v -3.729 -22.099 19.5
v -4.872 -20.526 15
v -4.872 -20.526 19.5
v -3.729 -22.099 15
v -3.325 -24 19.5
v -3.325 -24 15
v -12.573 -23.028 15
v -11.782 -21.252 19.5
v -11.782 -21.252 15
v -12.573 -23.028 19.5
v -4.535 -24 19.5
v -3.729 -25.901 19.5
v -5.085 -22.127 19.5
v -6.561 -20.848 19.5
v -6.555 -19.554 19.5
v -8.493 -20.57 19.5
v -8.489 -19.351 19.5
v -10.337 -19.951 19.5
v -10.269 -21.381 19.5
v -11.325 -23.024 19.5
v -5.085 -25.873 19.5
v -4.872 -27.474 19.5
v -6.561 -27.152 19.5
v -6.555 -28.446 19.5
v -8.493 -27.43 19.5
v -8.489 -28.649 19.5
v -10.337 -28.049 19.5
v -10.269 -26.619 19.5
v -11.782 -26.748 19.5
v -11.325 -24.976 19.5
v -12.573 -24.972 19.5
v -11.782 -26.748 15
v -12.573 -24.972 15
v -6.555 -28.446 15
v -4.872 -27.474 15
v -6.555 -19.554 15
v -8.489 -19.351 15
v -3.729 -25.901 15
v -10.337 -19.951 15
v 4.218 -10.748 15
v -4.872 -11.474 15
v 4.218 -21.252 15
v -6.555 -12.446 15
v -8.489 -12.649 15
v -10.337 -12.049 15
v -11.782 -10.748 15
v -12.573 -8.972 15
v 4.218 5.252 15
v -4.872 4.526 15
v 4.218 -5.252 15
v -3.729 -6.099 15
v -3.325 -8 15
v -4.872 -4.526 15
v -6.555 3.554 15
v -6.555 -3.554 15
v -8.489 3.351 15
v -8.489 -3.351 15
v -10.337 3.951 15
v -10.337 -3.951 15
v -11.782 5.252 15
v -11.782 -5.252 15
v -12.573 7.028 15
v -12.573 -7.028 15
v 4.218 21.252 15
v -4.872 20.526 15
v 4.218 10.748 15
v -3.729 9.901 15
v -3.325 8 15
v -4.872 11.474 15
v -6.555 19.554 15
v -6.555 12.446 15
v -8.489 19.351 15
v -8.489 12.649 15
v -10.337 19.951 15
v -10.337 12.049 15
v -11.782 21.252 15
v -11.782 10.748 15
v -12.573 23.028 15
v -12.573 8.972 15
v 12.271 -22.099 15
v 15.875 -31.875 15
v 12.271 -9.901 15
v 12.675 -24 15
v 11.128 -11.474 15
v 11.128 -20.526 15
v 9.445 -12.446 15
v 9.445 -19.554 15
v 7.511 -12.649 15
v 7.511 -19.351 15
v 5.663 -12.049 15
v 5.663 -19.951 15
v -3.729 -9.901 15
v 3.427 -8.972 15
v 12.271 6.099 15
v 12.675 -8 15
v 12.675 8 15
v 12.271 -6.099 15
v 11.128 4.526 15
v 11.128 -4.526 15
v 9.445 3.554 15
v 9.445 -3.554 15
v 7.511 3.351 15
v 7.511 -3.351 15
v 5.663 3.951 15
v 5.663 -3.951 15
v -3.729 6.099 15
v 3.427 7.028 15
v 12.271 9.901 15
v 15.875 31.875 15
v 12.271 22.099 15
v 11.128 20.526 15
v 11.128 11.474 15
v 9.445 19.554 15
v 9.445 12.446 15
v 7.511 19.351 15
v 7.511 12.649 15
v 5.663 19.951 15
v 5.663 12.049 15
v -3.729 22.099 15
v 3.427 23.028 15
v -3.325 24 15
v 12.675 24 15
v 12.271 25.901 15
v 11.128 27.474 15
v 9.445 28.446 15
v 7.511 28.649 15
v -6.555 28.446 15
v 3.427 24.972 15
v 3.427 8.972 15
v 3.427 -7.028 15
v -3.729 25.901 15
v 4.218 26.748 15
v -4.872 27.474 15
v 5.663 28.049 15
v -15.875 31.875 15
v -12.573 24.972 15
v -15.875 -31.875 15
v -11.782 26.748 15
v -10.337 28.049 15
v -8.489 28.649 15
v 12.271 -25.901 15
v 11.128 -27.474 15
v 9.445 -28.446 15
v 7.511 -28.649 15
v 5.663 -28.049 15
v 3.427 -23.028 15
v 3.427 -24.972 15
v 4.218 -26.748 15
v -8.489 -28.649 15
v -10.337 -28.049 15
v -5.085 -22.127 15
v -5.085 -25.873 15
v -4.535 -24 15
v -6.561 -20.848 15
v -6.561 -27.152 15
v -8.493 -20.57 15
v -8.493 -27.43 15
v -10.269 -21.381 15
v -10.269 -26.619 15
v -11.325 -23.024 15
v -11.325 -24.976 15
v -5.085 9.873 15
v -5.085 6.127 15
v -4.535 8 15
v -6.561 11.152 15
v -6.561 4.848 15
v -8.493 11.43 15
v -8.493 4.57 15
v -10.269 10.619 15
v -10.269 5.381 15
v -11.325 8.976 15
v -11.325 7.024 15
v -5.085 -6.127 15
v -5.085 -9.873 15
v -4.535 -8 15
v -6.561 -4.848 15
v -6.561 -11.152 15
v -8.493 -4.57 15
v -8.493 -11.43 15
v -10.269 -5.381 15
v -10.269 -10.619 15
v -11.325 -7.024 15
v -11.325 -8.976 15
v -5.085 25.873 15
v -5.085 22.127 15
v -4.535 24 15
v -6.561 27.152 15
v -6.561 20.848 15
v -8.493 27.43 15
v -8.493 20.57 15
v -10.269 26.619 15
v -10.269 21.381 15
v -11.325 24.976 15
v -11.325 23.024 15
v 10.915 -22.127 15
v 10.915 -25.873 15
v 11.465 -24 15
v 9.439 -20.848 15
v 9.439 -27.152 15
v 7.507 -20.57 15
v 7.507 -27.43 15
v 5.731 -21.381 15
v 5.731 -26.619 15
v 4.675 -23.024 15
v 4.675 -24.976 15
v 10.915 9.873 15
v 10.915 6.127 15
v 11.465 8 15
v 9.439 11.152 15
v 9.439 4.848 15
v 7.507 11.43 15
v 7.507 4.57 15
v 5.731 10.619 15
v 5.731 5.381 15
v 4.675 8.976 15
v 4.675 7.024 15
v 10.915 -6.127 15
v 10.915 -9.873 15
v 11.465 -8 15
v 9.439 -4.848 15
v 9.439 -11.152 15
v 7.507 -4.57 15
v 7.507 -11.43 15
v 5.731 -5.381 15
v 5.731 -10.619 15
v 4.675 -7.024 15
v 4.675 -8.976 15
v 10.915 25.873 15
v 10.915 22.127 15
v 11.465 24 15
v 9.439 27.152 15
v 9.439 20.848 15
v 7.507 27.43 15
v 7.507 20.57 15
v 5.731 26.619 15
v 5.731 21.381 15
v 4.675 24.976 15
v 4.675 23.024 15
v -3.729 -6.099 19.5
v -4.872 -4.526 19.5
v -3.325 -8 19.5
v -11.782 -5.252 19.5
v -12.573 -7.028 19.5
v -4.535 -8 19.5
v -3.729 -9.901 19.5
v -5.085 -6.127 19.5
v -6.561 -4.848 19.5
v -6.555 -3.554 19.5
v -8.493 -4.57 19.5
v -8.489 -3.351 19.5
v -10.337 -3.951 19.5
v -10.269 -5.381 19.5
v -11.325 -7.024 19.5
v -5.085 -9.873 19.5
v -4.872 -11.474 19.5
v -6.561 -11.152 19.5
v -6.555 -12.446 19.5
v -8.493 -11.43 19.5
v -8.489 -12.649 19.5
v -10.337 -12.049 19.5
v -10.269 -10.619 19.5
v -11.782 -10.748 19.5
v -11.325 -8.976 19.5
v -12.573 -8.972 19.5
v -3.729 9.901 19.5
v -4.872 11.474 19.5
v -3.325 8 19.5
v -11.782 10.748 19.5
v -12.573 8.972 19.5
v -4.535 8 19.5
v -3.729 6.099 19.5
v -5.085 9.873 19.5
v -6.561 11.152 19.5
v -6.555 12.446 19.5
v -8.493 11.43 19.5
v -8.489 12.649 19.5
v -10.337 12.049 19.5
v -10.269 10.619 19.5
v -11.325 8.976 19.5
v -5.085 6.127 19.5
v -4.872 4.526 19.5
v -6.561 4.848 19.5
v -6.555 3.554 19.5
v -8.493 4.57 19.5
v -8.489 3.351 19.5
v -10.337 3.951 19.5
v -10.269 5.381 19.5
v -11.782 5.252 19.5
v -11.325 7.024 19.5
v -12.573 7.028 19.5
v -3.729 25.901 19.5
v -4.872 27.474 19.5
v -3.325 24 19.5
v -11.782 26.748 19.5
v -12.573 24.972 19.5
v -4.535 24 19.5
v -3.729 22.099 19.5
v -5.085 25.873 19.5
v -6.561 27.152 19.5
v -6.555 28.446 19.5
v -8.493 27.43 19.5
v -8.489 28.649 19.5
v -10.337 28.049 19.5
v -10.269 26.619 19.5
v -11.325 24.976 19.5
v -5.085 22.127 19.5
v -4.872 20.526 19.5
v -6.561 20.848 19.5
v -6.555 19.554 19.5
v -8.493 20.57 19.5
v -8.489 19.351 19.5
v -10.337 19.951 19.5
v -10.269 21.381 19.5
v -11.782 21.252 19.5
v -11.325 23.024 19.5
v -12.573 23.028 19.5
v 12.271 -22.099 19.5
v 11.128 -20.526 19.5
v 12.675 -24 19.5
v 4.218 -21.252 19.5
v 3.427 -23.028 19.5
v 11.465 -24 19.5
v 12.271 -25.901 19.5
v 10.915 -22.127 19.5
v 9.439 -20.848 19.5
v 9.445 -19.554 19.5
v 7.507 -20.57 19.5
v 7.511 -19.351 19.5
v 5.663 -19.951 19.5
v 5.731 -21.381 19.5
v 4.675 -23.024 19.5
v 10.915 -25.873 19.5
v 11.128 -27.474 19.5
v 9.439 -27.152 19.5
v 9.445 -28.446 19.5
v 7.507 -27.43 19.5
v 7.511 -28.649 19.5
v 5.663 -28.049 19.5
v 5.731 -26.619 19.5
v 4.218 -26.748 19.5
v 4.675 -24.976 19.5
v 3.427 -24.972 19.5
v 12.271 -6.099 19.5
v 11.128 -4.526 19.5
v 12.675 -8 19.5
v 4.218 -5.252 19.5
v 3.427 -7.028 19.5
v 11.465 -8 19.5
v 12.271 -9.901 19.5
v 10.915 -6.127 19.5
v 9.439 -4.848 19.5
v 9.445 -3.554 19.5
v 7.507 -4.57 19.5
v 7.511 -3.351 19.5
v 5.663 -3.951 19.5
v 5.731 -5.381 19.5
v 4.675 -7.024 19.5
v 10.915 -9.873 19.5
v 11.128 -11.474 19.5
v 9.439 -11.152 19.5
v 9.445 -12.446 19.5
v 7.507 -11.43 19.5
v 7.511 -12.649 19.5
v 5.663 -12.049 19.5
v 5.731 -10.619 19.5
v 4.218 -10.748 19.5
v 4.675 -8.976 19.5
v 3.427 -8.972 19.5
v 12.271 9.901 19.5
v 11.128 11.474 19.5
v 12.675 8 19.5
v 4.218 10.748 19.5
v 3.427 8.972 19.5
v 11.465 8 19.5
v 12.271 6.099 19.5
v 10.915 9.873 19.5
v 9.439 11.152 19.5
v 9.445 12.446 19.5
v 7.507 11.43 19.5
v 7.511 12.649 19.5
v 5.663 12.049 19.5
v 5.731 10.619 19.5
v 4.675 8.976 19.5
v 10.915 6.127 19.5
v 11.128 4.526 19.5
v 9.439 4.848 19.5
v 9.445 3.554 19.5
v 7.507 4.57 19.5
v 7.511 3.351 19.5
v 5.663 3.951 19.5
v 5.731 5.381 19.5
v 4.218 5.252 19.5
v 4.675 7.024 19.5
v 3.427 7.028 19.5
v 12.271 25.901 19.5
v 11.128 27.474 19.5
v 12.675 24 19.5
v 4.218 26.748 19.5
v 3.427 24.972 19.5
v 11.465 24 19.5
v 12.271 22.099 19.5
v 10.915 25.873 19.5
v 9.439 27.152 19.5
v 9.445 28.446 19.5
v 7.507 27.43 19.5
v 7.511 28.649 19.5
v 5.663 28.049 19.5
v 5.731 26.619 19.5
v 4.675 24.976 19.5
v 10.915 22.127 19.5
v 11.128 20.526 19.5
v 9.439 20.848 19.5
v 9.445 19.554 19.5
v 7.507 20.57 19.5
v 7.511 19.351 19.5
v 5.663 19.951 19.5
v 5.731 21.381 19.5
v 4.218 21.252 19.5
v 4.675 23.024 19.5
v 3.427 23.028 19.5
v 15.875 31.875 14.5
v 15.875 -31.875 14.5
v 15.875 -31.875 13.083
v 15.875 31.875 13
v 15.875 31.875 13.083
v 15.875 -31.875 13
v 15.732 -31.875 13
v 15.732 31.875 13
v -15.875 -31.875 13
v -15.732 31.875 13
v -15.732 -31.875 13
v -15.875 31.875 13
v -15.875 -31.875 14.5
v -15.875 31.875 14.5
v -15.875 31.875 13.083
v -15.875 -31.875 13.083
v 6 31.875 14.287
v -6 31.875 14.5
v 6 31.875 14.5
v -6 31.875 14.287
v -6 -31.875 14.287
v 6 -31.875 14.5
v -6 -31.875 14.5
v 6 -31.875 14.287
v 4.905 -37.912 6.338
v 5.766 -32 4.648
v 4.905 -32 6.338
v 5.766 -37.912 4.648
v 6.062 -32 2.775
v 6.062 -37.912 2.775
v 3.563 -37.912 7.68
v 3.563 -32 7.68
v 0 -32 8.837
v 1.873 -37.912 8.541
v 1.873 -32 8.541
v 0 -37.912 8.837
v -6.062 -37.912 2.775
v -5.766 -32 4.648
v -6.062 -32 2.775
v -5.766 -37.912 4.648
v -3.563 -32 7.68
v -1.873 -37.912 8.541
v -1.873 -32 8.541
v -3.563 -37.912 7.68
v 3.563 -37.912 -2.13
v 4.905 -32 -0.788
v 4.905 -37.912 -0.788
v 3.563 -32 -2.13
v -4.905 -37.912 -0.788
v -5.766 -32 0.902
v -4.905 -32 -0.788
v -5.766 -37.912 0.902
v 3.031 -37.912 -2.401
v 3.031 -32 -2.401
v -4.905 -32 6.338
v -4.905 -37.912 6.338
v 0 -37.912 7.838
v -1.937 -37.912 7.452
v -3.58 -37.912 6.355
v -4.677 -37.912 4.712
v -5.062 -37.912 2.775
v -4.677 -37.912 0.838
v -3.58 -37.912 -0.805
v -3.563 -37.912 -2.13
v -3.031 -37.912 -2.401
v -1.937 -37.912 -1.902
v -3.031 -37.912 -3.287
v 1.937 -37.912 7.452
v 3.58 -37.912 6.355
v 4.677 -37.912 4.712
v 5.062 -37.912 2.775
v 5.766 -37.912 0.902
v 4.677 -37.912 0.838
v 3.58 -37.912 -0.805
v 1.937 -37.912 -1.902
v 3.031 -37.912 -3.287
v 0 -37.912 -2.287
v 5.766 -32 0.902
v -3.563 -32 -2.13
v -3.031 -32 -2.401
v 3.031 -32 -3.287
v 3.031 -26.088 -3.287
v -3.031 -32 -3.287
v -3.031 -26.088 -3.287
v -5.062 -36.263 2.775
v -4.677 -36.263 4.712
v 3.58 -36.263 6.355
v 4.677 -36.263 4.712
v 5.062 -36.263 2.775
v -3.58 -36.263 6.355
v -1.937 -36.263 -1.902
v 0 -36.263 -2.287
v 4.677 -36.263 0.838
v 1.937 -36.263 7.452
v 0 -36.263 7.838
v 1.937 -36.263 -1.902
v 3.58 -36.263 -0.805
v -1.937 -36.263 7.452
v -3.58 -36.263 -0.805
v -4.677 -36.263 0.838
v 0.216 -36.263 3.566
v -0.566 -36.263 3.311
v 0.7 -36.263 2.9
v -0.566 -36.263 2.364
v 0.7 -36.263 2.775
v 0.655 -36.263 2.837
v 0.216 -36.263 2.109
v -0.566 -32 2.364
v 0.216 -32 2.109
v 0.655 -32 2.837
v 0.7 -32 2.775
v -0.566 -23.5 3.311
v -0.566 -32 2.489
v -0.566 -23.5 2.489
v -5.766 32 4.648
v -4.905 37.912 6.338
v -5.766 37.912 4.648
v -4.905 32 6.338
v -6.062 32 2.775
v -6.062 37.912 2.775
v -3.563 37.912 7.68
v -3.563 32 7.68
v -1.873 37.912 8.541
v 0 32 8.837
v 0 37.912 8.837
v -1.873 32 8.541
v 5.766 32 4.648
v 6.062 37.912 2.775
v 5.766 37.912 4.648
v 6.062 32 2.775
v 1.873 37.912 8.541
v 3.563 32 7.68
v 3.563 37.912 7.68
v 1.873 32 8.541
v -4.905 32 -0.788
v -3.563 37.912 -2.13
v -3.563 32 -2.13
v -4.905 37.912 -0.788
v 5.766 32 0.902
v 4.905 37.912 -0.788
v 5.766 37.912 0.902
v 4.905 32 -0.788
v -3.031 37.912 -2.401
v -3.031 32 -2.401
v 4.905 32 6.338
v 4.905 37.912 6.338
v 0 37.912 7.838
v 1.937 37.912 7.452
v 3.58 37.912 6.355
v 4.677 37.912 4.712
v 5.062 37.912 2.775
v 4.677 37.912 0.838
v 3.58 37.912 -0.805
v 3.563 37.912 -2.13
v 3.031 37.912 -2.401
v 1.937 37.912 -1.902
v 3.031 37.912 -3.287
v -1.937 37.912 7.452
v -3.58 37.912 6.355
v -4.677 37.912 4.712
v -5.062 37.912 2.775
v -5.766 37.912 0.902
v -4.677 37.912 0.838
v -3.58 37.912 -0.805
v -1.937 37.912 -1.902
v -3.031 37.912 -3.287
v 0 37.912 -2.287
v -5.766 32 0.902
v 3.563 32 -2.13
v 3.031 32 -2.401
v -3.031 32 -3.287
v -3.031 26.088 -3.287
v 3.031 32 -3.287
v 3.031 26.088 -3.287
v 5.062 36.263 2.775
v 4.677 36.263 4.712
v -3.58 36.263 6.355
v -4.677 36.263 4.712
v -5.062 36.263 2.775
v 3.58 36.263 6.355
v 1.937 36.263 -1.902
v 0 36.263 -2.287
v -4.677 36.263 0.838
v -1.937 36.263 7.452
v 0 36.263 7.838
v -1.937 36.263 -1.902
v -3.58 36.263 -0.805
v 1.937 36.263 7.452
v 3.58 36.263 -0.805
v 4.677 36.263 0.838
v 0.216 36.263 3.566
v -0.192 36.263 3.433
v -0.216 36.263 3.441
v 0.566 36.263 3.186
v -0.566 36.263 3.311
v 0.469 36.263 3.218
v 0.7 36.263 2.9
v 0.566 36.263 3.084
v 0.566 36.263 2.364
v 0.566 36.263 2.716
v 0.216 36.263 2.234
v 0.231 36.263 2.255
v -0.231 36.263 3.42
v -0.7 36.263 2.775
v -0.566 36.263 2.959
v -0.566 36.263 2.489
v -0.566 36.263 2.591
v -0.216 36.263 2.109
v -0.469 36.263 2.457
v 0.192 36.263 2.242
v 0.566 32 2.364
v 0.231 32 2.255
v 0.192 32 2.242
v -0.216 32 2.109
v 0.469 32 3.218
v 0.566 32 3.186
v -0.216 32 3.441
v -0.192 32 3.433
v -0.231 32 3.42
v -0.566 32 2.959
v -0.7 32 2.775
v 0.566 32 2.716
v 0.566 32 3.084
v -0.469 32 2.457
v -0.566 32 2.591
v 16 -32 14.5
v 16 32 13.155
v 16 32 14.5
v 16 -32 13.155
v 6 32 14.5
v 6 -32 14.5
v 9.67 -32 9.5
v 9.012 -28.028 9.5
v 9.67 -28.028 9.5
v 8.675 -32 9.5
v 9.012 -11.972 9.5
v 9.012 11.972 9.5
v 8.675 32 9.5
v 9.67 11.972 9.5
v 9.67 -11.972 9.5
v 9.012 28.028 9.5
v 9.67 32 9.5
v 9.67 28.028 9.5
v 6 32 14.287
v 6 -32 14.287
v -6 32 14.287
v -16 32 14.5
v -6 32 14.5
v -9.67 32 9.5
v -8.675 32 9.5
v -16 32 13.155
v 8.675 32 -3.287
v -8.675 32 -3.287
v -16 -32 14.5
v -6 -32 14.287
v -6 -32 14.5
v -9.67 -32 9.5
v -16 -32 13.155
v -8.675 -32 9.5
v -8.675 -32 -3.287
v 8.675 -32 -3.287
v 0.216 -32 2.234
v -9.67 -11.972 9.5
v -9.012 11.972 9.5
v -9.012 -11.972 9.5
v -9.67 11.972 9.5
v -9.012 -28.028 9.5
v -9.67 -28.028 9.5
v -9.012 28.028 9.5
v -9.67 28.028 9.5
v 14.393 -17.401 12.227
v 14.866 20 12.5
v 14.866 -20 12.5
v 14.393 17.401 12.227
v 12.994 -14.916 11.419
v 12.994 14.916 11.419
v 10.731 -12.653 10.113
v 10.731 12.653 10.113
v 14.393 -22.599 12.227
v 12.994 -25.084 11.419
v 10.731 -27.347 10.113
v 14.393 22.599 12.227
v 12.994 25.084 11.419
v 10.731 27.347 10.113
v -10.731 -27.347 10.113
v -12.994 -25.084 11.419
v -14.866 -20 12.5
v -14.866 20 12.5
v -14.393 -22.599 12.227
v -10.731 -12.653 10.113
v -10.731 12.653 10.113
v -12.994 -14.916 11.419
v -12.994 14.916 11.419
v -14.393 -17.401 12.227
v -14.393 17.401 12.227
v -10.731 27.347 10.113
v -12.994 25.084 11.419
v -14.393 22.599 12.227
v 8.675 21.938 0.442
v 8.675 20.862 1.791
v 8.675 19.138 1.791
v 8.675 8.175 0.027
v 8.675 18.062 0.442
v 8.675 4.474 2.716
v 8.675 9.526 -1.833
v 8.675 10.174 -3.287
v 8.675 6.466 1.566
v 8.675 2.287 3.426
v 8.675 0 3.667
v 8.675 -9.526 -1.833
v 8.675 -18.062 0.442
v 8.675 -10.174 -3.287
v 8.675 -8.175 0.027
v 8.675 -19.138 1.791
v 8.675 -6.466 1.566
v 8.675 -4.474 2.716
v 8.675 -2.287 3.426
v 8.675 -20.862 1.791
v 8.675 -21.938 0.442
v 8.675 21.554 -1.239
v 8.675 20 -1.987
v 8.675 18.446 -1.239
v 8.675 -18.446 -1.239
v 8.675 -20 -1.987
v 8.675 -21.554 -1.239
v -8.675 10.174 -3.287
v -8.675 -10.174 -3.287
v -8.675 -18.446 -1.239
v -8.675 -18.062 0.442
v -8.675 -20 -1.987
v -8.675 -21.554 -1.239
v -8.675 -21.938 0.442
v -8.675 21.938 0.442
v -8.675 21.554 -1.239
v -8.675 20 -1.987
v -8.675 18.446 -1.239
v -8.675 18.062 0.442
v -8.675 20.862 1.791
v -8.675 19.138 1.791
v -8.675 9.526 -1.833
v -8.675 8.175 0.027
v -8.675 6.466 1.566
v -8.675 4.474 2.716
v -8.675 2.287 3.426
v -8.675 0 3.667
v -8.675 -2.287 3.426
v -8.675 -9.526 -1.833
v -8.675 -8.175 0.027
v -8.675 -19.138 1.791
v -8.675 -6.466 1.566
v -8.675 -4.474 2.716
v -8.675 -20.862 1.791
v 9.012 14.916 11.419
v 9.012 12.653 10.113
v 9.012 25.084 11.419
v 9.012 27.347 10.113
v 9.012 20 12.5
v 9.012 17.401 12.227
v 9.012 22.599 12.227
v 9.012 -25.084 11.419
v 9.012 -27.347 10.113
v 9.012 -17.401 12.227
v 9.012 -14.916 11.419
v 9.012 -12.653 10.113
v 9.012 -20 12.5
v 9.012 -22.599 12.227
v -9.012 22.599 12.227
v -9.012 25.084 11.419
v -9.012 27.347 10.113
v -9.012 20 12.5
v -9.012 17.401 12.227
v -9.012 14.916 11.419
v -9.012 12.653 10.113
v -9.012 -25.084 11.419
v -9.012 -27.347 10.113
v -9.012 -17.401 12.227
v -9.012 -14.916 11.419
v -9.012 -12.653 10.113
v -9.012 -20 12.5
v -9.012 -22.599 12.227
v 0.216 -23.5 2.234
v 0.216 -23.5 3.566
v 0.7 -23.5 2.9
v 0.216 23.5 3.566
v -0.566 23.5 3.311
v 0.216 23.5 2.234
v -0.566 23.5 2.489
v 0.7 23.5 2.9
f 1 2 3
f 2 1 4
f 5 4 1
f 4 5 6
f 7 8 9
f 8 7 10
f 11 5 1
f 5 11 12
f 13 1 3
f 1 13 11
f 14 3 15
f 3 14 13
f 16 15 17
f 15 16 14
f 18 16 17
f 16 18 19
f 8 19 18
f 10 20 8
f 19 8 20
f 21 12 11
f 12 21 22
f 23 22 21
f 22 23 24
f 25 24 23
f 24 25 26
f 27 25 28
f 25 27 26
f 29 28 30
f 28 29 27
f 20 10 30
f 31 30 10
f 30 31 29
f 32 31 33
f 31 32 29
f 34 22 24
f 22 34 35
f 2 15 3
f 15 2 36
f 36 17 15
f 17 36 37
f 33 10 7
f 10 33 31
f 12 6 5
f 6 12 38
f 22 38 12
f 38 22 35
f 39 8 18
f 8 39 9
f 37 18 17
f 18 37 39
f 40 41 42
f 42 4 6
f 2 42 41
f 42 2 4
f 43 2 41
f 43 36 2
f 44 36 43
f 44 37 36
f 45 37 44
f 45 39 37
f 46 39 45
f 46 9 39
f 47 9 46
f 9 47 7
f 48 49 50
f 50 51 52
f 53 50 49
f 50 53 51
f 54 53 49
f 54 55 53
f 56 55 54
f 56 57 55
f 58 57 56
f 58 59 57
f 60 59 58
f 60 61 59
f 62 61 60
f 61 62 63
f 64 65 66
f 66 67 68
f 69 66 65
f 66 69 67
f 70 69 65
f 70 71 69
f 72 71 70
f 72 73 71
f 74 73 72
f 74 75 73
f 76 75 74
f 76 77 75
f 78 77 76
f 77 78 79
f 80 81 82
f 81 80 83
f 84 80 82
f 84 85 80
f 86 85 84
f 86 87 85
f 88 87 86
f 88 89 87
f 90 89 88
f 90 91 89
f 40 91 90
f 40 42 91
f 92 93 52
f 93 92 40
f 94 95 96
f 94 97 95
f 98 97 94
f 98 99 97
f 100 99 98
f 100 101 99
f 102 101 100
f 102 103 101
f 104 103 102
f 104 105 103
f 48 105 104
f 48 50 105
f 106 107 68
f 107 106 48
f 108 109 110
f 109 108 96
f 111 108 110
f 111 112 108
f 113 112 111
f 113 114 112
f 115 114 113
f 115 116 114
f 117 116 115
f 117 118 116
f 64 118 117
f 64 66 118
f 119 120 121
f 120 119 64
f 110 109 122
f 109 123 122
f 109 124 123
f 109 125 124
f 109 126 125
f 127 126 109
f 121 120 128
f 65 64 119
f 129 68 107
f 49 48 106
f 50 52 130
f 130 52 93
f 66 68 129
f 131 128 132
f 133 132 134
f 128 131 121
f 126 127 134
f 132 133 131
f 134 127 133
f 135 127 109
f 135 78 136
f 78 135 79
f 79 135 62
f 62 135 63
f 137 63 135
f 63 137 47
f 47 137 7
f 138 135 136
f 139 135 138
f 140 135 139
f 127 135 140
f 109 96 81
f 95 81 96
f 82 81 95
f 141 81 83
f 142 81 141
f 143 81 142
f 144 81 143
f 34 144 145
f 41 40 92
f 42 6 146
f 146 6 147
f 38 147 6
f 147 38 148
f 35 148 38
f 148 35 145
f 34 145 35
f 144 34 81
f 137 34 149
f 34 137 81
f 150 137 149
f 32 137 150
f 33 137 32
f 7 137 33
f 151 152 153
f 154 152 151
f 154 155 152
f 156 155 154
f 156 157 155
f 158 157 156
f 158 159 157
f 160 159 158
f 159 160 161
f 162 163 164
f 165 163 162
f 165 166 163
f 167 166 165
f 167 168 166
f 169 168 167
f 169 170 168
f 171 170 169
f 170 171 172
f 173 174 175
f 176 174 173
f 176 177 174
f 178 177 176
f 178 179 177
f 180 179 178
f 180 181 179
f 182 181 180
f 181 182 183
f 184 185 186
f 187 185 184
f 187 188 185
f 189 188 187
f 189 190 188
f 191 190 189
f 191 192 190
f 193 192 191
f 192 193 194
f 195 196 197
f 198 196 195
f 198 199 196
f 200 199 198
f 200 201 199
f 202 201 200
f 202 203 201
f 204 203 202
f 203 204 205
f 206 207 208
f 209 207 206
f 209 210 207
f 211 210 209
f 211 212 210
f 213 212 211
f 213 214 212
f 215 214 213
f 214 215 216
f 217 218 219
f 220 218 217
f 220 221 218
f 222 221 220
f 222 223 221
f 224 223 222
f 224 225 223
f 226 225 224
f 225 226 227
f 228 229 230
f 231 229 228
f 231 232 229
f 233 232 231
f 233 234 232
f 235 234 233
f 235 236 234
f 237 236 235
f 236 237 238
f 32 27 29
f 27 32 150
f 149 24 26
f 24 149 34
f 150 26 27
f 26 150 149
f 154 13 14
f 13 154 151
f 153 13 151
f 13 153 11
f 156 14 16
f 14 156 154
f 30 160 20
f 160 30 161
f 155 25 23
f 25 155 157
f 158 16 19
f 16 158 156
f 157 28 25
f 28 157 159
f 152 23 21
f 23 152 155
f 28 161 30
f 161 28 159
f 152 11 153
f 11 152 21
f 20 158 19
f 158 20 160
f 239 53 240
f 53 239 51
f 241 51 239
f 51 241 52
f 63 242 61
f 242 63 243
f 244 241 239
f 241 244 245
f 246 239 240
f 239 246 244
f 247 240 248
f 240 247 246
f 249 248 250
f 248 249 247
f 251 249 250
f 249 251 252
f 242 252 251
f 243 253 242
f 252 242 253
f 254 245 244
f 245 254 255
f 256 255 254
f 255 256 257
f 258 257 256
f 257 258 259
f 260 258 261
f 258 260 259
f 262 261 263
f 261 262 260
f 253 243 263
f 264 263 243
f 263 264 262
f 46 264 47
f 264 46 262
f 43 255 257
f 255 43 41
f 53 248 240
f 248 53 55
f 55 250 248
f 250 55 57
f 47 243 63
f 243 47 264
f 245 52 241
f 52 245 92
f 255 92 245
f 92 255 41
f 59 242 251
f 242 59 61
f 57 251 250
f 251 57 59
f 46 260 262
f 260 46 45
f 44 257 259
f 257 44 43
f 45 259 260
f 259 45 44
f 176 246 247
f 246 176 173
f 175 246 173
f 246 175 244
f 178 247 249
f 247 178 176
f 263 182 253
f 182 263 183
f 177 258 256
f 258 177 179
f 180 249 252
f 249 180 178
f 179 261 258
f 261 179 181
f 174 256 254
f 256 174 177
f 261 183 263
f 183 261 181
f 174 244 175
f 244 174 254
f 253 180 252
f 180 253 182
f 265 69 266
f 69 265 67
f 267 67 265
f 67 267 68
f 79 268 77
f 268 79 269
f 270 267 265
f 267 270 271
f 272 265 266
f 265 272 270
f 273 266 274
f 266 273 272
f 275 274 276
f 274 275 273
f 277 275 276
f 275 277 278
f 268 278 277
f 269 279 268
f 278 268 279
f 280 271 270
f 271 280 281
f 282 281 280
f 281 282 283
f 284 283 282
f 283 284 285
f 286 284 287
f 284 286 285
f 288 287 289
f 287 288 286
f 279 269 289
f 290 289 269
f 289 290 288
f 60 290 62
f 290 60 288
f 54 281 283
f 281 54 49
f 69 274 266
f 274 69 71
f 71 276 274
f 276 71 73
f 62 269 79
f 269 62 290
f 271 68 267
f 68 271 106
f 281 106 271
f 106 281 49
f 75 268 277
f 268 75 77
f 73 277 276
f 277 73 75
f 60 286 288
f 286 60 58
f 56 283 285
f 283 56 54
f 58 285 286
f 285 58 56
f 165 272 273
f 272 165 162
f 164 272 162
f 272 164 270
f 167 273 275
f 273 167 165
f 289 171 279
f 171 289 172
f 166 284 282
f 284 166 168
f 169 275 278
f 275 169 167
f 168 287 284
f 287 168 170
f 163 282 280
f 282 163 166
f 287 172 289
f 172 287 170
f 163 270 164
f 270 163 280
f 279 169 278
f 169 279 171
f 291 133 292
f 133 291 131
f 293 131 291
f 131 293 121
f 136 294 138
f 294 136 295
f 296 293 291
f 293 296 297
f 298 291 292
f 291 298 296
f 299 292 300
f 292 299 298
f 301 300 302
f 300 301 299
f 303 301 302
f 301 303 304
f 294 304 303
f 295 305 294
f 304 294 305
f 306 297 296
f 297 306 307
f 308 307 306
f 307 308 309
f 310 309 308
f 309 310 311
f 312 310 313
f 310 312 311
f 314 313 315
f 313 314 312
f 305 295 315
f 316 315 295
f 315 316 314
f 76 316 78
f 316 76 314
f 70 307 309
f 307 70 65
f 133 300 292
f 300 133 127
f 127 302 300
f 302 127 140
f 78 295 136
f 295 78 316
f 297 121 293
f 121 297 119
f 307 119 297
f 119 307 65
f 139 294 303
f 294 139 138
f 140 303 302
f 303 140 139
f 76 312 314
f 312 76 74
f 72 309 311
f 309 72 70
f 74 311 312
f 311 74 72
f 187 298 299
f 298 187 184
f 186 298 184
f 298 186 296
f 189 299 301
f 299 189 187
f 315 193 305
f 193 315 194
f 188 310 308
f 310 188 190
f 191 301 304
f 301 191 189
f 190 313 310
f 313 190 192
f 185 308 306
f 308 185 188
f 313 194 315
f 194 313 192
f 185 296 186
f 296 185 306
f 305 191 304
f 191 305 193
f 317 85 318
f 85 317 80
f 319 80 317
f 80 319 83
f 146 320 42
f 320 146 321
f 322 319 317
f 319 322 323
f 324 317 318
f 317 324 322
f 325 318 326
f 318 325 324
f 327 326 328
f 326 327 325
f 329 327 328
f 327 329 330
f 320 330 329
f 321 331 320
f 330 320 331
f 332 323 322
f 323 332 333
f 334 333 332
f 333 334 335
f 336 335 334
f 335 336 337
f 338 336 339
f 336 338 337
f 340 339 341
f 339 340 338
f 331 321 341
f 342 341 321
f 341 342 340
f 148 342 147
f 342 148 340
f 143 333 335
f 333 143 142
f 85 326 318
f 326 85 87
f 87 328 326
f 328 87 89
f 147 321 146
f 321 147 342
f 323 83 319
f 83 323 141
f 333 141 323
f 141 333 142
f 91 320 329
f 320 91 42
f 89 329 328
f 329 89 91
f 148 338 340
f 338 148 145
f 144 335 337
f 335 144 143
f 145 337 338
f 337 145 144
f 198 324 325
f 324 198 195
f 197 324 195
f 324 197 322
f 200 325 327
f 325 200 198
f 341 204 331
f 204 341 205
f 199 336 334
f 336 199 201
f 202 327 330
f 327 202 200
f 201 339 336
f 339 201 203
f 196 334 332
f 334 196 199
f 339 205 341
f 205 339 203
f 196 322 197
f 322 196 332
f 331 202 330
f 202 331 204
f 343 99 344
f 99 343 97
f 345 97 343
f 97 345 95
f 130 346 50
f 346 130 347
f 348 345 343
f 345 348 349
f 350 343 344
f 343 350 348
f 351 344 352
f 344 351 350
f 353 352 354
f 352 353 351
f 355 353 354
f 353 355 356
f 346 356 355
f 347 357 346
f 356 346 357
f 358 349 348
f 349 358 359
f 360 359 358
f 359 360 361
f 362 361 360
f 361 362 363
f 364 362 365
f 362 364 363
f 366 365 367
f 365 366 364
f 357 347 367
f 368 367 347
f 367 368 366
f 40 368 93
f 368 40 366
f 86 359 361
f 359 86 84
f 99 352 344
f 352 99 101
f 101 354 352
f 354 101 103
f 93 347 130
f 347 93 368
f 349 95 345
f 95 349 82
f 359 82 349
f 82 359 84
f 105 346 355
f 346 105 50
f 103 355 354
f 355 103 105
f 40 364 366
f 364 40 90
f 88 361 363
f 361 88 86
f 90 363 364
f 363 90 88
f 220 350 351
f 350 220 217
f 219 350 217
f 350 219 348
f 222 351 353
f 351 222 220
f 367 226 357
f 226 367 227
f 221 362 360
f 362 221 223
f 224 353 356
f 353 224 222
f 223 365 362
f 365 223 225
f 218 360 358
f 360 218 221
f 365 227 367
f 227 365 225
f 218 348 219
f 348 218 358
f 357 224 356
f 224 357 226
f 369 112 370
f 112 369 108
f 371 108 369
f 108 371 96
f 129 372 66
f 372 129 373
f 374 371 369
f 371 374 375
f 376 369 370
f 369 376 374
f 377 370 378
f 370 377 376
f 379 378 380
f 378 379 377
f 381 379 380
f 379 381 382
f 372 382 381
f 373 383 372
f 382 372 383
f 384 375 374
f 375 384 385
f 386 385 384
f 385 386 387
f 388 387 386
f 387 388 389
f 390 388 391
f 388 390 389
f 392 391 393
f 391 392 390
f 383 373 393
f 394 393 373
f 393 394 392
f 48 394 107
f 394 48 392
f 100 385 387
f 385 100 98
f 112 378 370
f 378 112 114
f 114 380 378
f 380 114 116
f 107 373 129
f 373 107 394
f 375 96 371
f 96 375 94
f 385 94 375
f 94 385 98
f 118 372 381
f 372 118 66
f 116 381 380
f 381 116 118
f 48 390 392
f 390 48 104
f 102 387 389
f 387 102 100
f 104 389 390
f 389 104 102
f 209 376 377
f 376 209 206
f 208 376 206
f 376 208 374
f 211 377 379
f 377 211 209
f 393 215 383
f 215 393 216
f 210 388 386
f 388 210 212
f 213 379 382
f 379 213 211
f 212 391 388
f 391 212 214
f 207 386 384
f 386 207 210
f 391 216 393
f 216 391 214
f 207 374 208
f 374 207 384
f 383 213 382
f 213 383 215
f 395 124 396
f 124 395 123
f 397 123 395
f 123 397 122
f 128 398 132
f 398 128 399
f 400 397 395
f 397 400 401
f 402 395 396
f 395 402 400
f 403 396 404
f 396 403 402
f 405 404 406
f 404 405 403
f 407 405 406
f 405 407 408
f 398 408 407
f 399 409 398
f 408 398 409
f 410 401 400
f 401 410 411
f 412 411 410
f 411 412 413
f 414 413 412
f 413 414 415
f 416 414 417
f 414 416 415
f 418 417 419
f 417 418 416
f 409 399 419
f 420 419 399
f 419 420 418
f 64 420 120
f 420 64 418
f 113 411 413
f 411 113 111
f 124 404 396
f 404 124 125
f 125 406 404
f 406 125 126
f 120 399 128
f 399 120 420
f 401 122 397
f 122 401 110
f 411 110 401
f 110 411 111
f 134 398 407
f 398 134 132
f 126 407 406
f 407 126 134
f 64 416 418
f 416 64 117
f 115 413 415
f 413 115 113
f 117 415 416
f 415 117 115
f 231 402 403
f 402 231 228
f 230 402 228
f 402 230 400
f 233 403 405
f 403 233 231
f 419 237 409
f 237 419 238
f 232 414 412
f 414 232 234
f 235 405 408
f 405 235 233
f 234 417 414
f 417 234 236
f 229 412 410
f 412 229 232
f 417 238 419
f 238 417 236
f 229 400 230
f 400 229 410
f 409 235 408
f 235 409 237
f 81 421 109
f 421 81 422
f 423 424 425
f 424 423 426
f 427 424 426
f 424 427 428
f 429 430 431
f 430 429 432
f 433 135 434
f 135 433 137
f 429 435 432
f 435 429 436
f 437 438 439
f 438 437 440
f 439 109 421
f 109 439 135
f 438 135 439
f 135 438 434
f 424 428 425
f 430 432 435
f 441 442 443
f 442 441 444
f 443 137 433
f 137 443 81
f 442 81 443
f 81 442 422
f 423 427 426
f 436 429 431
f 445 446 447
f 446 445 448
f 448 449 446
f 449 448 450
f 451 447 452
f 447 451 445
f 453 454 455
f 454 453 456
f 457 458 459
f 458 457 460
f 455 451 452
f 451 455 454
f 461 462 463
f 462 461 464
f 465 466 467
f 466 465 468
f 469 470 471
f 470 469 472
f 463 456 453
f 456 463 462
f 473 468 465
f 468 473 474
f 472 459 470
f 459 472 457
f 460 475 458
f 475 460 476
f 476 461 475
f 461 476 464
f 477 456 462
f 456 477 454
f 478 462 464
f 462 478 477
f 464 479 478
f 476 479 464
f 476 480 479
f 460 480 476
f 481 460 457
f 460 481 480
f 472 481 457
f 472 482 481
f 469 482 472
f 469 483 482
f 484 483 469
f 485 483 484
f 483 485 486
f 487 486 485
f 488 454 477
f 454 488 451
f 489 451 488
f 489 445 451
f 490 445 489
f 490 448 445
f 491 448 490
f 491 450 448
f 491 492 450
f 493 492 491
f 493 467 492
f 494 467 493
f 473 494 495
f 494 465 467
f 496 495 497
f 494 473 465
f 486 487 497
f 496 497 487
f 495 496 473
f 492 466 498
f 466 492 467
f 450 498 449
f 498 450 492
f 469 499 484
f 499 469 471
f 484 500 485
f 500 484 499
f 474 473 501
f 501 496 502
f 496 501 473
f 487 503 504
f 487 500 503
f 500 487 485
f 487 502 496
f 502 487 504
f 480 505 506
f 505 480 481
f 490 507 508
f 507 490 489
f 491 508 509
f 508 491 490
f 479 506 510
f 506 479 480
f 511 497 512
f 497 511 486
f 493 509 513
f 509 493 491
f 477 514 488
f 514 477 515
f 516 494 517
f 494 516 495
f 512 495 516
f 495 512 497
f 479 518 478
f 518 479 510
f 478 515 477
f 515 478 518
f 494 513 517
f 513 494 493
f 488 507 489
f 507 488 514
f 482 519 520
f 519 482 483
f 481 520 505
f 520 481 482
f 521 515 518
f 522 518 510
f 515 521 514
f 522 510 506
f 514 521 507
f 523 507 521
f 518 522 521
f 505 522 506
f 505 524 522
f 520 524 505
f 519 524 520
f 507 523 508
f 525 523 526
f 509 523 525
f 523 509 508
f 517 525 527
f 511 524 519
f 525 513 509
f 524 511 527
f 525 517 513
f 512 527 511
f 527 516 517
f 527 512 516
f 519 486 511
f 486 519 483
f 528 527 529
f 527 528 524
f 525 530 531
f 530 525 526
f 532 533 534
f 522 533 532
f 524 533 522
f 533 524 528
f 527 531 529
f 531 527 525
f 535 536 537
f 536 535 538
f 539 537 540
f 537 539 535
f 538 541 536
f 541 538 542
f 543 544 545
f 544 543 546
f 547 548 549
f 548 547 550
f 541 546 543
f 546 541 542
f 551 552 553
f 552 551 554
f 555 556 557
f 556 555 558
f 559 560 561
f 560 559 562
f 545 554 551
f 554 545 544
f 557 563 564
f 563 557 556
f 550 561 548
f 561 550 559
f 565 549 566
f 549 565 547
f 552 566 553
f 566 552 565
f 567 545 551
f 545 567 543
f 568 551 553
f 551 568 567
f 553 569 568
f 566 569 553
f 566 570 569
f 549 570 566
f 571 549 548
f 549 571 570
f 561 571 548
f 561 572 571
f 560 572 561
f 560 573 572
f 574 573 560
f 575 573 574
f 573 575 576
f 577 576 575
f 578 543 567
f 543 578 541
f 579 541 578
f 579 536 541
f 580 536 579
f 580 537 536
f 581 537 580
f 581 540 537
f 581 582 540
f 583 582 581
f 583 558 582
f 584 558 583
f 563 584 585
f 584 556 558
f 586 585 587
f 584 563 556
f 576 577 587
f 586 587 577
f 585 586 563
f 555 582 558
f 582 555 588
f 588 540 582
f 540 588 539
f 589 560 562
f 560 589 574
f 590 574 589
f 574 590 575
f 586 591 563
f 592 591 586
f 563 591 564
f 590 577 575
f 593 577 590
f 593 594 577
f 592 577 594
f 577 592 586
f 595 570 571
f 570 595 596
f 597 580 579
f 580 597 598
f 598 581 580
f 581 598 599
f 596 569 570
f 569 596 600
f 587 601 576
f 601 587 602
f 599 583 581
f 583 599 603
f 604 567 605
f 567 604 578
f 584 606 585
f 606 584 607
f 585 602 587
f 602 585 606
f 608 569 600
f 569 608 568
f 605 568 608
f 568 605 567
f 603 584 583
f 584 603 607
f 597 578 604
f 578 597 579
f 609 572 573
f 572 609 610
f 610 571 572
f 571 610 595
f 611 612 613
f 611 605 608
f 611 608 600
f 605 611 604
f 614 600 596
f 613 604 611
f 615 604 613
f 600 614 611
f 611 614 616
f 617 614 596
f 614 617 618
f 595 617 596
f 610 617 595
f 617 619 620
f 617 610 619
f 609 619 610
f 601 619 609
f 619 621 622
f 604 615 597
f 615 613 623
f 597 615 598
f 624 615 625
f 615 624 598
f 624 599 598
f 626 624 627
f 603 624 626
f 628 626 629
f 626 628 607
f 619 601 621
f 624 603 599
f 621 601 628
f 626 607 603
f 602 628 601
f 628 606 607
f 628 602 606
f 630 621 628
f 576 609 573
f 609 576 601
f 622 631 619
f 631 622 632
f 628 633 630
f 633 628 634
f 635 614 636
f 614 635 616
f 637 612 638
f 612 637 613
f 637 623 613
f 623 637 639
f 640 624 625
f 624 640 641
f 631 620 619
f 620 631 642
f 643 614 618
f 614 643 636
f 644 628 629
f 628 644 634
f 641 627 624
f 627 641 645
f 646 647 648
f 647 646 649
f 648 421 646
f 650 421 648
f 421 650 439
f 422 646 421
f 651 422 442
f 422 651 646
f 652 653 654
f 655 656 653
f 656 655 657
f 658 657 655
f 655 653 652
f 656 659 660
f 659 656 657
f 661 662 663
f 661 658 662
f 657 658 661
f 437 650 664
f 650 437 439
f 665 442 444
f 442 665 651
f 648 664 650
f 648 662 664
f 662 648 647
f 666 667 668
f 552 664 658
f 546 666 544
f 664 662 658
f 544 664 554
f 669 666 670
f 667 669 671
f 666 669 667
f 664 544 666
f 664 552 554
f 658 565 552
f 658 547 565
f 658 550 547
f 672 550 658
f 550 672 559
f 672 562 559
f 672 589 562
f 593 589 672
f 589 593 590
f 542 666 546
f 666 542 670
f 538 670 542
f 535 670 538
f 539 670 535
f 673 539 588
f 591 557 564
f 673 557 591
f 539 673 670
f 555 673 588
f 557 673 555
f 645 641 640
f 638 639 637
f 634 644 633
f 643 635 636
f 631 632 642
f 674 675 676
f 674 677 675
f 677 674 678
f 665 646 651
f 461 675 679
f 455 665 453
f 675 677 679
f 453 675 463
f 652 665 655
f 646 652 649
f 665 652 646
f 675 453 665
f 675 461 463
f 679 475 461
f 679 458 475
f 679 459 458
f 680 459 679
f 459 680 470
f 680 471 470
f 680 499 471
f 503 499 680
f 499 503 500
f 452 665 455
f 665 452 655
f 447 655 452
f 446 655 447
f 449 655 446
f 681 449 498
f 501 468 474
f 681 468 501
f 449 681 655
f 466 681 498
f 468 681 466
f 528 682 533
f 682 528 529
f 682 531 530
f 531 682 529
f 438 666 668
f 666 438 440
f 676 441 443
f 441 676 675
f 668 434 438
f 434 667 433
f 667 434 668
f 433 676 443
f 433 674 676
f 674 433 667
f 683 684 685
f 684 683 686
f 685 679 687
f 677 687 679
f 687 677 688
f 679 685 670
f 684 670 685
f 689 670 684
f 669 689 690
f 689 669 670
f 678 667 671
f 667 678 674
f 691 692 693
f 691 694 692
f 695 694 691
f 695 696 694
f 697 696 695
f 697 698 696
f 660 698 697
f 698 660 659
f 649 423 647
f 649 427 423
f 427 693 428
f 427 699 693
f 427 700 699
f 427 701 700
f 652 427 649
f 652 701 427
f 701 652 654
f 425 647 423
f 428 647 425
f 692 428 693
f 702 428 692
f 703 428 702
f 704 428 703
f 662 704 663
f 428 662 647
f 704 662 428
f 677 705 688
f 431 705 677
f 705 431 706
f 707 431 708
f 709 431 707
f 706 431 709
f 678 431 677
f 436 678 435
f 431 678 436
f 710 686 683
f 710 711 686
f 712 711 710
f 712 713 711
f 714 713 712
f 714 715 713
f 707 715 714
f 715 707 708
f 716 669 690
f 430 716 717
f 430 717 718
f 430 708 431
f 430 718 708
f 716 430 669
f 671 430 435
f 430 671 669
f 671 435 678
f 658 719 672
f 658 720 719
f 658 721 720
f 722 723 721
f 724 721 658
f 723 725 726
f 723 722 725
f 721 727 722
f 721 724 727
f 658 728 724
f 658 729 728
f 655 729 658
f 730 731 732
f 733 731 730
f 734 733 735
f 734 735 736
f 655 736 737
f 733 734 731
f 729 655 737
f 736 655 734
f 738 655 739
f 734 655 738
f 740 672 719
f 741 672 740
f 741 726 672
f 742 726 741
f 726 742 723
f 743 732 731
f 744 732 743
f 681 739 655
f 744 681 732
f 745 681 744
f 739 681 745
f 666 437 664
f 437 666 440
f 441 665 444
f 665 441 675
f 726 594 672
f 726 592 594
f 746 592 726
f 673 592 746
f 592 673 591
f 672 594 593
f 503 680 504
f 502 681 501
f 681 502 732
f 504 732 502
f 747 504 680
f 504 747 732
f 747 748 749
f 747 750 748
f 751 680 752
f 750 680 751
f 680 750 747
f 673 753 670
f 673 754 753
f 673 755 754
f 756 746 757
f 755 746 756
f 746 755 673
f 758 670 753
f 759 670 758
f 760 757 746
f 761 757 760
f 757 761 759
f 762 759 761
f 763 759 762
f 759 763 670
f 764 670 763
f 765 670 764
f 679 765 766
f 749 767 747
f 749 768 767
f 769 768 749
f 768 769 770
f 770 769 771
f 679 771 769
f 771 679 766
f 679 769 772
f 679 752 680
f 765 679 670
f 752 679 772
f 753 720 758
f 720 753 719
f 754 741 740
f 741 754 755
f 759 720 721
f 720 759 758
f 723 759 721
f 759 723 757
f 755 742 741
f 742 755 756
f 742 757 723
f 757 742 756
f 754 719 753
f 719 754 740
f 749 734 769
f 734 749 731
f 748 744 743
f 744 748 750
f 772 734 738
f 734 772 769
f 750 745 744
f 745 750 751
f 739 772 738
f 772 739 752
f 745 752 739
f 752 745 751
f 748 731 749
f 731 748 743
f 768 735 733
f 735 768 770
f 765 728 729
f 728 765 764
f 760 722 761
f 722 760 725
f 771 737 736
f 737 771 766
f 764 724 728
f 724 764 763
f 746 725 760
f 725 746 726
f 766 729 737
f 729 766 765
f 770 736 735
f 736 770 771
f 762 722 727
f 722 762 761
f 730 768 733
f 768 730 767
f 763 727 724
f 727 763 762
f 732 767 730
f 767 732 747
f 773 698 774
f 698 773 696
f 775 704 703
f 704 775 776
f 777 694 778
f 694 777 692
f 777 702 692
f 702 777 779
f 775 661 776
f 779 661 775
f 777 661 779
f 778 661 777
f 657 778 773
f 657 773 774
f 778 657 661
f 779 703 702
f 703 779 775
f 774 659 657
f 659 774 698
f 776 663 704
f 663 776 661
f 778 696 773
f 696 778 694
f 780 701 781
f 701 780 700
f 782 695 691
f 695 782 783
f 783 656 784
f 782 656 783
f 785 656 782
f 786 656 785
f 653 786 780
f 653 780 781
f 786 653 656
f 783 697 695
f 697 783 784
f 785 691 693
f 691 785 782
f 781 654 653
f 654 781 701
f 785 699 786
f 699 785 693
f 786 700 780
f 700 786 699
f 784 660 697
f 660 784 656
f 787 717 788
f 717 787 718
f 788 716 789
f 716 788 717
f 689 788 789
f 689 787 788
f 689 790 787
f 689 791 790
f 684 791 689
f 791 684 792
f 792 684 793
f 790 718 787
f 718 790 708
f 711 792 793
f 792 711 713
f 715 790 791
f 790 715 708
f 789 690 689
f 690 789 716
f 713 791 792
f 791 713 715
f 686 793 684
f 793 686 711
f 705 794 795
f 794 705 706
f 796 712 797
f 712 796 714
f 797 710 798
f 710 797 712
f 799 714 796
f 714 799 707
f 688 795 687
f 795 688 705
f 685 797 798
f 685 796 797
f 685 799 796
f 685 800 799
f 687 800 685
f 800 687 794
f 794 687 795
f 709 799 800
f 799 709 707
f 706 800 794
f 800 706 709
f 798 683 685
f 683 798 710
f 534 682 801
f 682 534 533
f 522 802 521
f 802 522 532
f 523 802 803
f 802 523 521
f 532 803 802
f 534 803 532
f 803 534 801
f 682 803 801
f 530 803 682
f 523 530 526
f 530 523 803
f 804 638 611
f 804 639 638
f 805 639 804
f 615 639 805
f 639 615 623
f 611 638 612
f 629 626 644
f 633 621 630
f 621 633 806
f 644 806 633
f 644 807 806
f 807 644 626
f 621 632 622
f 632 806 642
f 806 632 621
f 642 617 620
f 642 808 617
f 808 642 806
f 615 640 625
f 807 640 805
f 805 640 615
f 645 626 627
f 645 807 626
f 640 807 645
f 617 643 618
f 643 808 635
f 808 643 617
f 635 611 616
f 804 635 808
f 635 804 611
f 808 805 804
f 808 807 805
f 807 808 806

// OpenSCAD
module duplo_nipple(outer = 9.35, inner = 6.93, height = 4.5)
{
  difference()
  {
    cylinder(height,outer/2,outer/2,center=true);
    cylinder(height+1,inner/2,inner/2,center=true);
  }
}

module duplo_top(x = 2, y = 4, spacing = 16.0, parimeter = 3.2+9.35/2, height = 4.5, thickness = 2)
{
  union()
  {
    for (i = [0:x-1]) 
    {
      for (j = [0:y-1])
      {
        translate([((i-(x-1)/2)*spacing),((j-(y-1)/2)*spacing),(height+thickness)/2]) duplo_nipple();
      }
    }
    cube([(x-1)*spacing+2*parimeter,(y-1)*spacing+2*parimeter,thickness],center=true);
  }
}


module duplo_support(width, height, y = 4, spacing = 16.0, parimeter = 3.2+9.35/2, height = 4.5, thickness = 2)
{
  cube([width,(y-1)*spacing+2*parimeter,height],center=true);
}


module wheel2(wheel_thinkness = 4.0, 
wheel_diameter = 22.0,
axel_diameter = 5.0,
axel_mount_depth = 6.0)
{
  axel_support_thinkness = 1;
  center_slant = wheel_diameter;
  center_diameter = axel_mount_depth + axel_support_thinkness;
  difference()
  {
    union()
    {
      difference()
      {
        cylinder(wheel_thinkness,wheel_diameter/2,wheel_diameter/2,center=true);
        cylinder(wheel_thinkness+0.1,(wheel_diameter-3)/2,0,center=true);
      }
      translate([0,0,-(axel_mount_depth-wheel_thinkness)/2]) cylinder(axel_mount_depth,center_diameter/2,center_slant/2,center=true);
    }
    translate([0,0,-(axel_mount_depth-wheel_thinkness)/2]) cylinder(axel_mount_depth+1,axel_diameter/2,axel_diameter/2,center=true);
  }
}

module simple_axel(length, thickness)
{
  cylinder(length,thickness/2,thickness/2,center=true);
}

module wheel_assembly(wheel_base = 25.35,
wheel_thinkness = 4.0, 
wheel_diameter = 22.0,
axel_diameter = 3.175,
axel_mount_depth = 6.0)
{
  %translate([wheel_base/2,0,0]) rotate([0,-90,0]) wheel2(wheel_thinkness, wheel_diameter, axel_diameter, axel_mount_depth);
  %translate([-wheel_base/2,0,0]) rotate([0,90,0]) wheel2(wheel_thinkness, wheel_diameter, axel_diameter, axel_mount_depth);
  rotate([0,90,0]) simple_axel(wheel_base+2*(axel_mount_depth-wheel_thinkness/2), axel_diameter);
}

module short_block(spacing = 32)
{
  translate([0,spacing/2,0]) wheel_assembly();
  translate([0,-spacing/2,0]) wheel_assembly();
  //TODO make a spinning, loose duplo top for this train car part
  translate([0,0,8]) cylinder(10,8,8,center=true);
  
  translate([0,0,12]) cylinder(2,(spacing-4)/2,(spacing+4)/2,center=true);
  
  translate([0,0,14]) duplo_top(x = 2, y = 3);
  //TODO add one magnet mount block to match the other train cars
}

module tack()
{
  pin_diameter = 1.4;
  pin_length = 17;
  tack_diameter = 11;
  tack_thickness = 3.65;
  color("gray") union()
  {
    cylinder(pin_length,pin_diameter/2,pin_diameter/2,center=true);
    translate([0,0,(pin_length-tack_thickness)/2]) cylinder(tack_thickness,tack_diameter/2,pin_diameter/2,center=true);
  }
}

module magnet()
{
  od = 12.7;
  id = 3.175;
  thickness = 3.175;
  color("lightblue") difference()
  {
    cylinder(thickness,od/2,od/2,center=true);
    cylinder(thickness+0.1,id/2,id/2,center=true);
  }
}

module magnet_assembly()
{
  tack();
  translate([0,0,(17/2-(3.6+3.175/2))]) magnet();
}

module magnet_holder(magnet_od = 12.7+0.7,
pin_od = 1.4,
pin_depth = 10.225,
magnet_depth = 3.175,
thickness = 1)
{
  holder_od = magnet_od + 2 * thickness;
  difference()
  {
    union()
    {
      cylinder(pin_depth+magnet_depth,holder_od/2,holder_od/2,center=true);
      translate([0,thickness-holder_od/2],0) cube([holder_od/2,2 * thickness,pin_depth+magnet_depth],center=true);
    }
    translate([0,0,pin_depth/2]) cylinder(magnet_depth+0.1,magnet_od/2,magnet_od/2,center=true);
    cylinder(pin_depth+magnet_depth,pin_od/2,pin_od/2,center=true);
  }
}

module magnet_holder1()
{
  magnet_holder(9.525+0.6,1.4,10.225,1.6);
}

module short_car(mode = 0)
{
  //mode 0 is the body with wheel assembly grayed out
  //mode 1 shows the wheels only on there side
  //mode 2 shows the axel only
  
  spacing = 40;
  
  wheel_base = 25.35;
  wheel_thinkness = 4.0;
  wheel_diameter = 22.0;
  axel_diameter = 3.175+0.4;  //0.125 inch rod
  axel_clearance = 0.4 + axel_diameter;
  wheel_well = wheel_diameter + 3;
  axel_mount_depth = 6.0;
  
  magnet_height = 16.5-2.6;
  
  
  if(mode == 0)
  {
    //wheel assembly place holder
    %translate([0,spacing/2,0]) wheel_assembly(wheel_base,wheel_thinkness,wheel_diameter,axel_diameter,axel_mount_depth);
    %translate([0,-spacing/2,0]) wheel_assembly(wheel_base,wheel_thinkness,wheel_diameter,axel_diameter,axel_mount_depth);
    
    //duplo train top
    translate([0,0,14]) duplo_top(x = 2, y = 4);
    
    //train body
    body_width = wheel_base-wheel_thinkness*2;
    well_depth = (32 - body_width)/2;
    difference()
    {
      union()
      {
        //magnet holders
        translate([0,-32,magnet_height-wheel_diameter/2-0.125]) rotate([90,0,0]) magnet_holder1();
        translate([0,32,magnet_height-wheel_diameter/2-0.125]) rotate([-90,180,0]) magnet_holder1();
        //main body
        translate([0,0,wheel_diameter/4]) cube([body_width,64,14+axel_diameter],center=true);
        difference()
        {
          union()
          {
            translate([(32-10)/2,0,12]) cube([10,64,5],center=true);
            translate([-(32-10)/2,0,12]) cube([10,64,5],center=true);
          }
          translate([(32-10)/2,0,12]) rotate([0,-30,0]) translate([0,0,-4]) cube([10,65,5],center=true);
          translate([-(32-10)/2,0,12]) rotate([0,30,0]) translate([0,0,-4]) cube([10,65,5],center=true);
        }
      }
      translate([0,spacing/2,0]) rotate([0,90,0]) cylinder(body_width+0.1,axel_clearance/2,axel_clearance/2,center=true);
      translate([0,-spacing/2,0]) rotate([0,90,0]) cylinder(body_width+0.1,axel_clearance/2,axel_clearance/2,center=true);
      translate([0,0,-wheel_diameter/3]) rotate([0,90,0]) cylinder(body_width+0.1,wheel_diameter/2,wheel_diameter/2,center=true);
      //removing wheel well area
      translate([0,spacing/2,0]) translate([wheel_base/2,0,0]) rotate([0,-90,0])  cylinder(well_depth,wheel_well/2,wheel_well/2,center=true);
      translate([0,-spacing/2,0]) translate([wheel_base/2,0,0]) rotate([0,-90,0])  cylinder(well_depth,wheel_well/2,wheel_well/2,center=true);
      translate([0,spacing/2,0]) translate([-wheel_base/2,0,0]) rotate([0,-90,0])  cylinder(well_depth,wheel_well/2,wheel_well/2,center=true);
      translate([0,-spacing/2,0]) translate([-wheel_base/2,0,0]) rotate([0,-90,0])  cylinder(well_depth,wheel_well/2,wheel_well/2,center=true);
      
      //ensure the pins have a full hole
      pin_od = 1.4;
      translate([0,-32,magnet_height-wheel_diameter/2]) rotate([90,0,0]) cylinder(17,pin_od/2,pin_od/2,center=true);
      translate([0,32,magnet_height-wheel_diameter/2]) rotate([-90,0,0]) cylinder(17,pin_od/2,pin_od/2,center=true);
    }
  }
  else
  {
    if(mode == 1)
    {
      rotate([180,0,0]) wheel2(wheel_thinkness, wheel_diameter, axel_diameter, axel_mount_depth);
    }
    else
    {
      rotate([90,0,0]) simple_axel(wheel_base+2*(axel_mount_depth-wheel_thinkness/2), axel_diameter);
    }
  }
  
}

module train_truck(mode = 0)
{
  wheel_base = 25.35;
  wheel_thinkness = 4.0;
  wheel_diameter = 22.0;
  axel_diameter = 3.175+0.4;  //0.125 inch rod
  axel_clearance = 0.4 + axel_diameter;
  wheel_well = wheel_diameter + 3;
  axel_mount_depth = 6.0;
  
  magnet_height = 16.5-2.6;
  spacing = wheel_diameter + 2;
  
  length = wheel_diameter + spacing + 5;
  height = 10;
  
  if(mode == 0)
  {
    //wheel assembly place holder
    %translate([0,spacing/2,0]) wheel_assembly(wheel_base,wheel_thinkness,wheel_diameter,axel_diameter,axel_mount_depth);
    %translate([0,-spacing/2,0]) wheel_assembly(wheel_base,wheel_thinkness,wheel_diameter,axel_diameter,axel_mount_depth);
    
    //train body
    body_width = wheel_base-wheel_thinkness*2;
    difference()
    {
      union()
      {
        //magnet holders
        translate([0,-length/2+2,magnet_height-wheel_diameter/2]) rotate([90,0,0]) magnet_holder1();
        //main body
        translate([0,0,height/2-2]) minkowski()
        {
          rounding = 2;
          cube([body_width-rounding,length-rounding,height+axel_diameter-rounding],center=true);
          sphere(rounding/2);
        }
      }
      translate([0,spacing/2,0]) rotate([0,90,0]) cylinder(body_width+0.1,axel_clearance/2,axel_clearance/2,center=true);
      translate([0,-spacing/2,0]) rotate([0,90,0]) cylinder(body_width+0.1,axel_clearance/2,axel_clearance/2,center=true);
      
      //ensure the pins have a full hole
      pin_od = 1.4;
      %translate([0,-length/2+4,magnet_height-wheel_diameter/2]) rotate([90,0,0]) cylinder(17,pin_od/2,pin_od/2,center=true);
      
      through_hole = 4;
      mount_diameter = 7;
      mount_thickness = 4;
      //rotational hole and mounting
      translate([0,0,height/2-2]) cylinder(height+axel_diameter+1,through_hole,through_hole,center=true);
      translate([0,0,mount_thickness/2-4]) cylinder(mount_thickness,mount_diameter,mount_diameter,center=true);
      translate([0,0,height+mount_thickness/2-4]) cylinder(mount_thickness,mount_diameter,mount_diameter,center=true);
      
    }
  }
  else
  {
    if(mode == 1)
    {
      rotate([180,0,0]) wheel2(wheel_thinkness, wheel_diameter, axel_diameter, axel_mount_depth);
    }
    else
    {
      echo(wheel_base+2*(axel_mount_depth-wheel_thinkness/2));
      rotate([90,0,0]) simple_axel(wheel_base+2*(axel_mount_depth-wheel_thinkness/2), axel_diameter);
    }
  }
  
}

module truck_plug(length = 15)
{
  mount_diameter = 6;
  mount_thickness = 2;
  through_hole = 3;

  translate([0,0,length/2]) cylinder(length,through_hole,through_hole,center=true);
  translate([0,0,mount_thickness/2]) cylinder(mount_thickness,mount_diameter,mount_diameter,center=true);
}

module truck_car()
{
  spacing = 60;
  mount_diameter = 6;
  mount_thickness = 8;
  through_hole = 3;
  difference()
  {
    union()
    {
      //duplo train top
      translate([0,0,14]) duplo_top(x = 2, y = 6);
      translate([0,0,14-2]) duplo_support(10, 2, y = 6);
      translate([0,-spacing/2,14-mount_thickness/2]) cylinder(mount_thickness,mount_diameter,mount_diameter,center=true); 
      translate([0,spacing/2,14-mount_thickness/2]) cylinder(mount_thickness,mount_diameter,mount_diameter,center=true);  
    }
    translate([0,-spacing/2,14-mount_thickness/2]) cylinder(mount_thickness,through_hole,through_hole,center=true);  
    translate([0,spacing/2,14-mount_thickness/2]) cylinder(mount_thickness,through_hole,through_hole,center=true);  
  }
  
  %translate([0,-spacing/2,-3]) truck_plug();
  %translate([0,spacing/2,-3]) truck_plug();
  
  %translate([0,-spacing/2,0]) train_truck();
  %translate([0,spacing/2,0]) rotate([0,0,180]) train_truck();
}

//wheels();
//rotate([90,0,0]) bolt();
//train_car_long(hook_support = 1);
//train_car1(hook_support = 0);
//short_block();

short_car(0);

//train_truck(2);
//truck_car();
//truck_plug();
//rotate([180,0,0]) wheel2();
//wheel_assembly();
